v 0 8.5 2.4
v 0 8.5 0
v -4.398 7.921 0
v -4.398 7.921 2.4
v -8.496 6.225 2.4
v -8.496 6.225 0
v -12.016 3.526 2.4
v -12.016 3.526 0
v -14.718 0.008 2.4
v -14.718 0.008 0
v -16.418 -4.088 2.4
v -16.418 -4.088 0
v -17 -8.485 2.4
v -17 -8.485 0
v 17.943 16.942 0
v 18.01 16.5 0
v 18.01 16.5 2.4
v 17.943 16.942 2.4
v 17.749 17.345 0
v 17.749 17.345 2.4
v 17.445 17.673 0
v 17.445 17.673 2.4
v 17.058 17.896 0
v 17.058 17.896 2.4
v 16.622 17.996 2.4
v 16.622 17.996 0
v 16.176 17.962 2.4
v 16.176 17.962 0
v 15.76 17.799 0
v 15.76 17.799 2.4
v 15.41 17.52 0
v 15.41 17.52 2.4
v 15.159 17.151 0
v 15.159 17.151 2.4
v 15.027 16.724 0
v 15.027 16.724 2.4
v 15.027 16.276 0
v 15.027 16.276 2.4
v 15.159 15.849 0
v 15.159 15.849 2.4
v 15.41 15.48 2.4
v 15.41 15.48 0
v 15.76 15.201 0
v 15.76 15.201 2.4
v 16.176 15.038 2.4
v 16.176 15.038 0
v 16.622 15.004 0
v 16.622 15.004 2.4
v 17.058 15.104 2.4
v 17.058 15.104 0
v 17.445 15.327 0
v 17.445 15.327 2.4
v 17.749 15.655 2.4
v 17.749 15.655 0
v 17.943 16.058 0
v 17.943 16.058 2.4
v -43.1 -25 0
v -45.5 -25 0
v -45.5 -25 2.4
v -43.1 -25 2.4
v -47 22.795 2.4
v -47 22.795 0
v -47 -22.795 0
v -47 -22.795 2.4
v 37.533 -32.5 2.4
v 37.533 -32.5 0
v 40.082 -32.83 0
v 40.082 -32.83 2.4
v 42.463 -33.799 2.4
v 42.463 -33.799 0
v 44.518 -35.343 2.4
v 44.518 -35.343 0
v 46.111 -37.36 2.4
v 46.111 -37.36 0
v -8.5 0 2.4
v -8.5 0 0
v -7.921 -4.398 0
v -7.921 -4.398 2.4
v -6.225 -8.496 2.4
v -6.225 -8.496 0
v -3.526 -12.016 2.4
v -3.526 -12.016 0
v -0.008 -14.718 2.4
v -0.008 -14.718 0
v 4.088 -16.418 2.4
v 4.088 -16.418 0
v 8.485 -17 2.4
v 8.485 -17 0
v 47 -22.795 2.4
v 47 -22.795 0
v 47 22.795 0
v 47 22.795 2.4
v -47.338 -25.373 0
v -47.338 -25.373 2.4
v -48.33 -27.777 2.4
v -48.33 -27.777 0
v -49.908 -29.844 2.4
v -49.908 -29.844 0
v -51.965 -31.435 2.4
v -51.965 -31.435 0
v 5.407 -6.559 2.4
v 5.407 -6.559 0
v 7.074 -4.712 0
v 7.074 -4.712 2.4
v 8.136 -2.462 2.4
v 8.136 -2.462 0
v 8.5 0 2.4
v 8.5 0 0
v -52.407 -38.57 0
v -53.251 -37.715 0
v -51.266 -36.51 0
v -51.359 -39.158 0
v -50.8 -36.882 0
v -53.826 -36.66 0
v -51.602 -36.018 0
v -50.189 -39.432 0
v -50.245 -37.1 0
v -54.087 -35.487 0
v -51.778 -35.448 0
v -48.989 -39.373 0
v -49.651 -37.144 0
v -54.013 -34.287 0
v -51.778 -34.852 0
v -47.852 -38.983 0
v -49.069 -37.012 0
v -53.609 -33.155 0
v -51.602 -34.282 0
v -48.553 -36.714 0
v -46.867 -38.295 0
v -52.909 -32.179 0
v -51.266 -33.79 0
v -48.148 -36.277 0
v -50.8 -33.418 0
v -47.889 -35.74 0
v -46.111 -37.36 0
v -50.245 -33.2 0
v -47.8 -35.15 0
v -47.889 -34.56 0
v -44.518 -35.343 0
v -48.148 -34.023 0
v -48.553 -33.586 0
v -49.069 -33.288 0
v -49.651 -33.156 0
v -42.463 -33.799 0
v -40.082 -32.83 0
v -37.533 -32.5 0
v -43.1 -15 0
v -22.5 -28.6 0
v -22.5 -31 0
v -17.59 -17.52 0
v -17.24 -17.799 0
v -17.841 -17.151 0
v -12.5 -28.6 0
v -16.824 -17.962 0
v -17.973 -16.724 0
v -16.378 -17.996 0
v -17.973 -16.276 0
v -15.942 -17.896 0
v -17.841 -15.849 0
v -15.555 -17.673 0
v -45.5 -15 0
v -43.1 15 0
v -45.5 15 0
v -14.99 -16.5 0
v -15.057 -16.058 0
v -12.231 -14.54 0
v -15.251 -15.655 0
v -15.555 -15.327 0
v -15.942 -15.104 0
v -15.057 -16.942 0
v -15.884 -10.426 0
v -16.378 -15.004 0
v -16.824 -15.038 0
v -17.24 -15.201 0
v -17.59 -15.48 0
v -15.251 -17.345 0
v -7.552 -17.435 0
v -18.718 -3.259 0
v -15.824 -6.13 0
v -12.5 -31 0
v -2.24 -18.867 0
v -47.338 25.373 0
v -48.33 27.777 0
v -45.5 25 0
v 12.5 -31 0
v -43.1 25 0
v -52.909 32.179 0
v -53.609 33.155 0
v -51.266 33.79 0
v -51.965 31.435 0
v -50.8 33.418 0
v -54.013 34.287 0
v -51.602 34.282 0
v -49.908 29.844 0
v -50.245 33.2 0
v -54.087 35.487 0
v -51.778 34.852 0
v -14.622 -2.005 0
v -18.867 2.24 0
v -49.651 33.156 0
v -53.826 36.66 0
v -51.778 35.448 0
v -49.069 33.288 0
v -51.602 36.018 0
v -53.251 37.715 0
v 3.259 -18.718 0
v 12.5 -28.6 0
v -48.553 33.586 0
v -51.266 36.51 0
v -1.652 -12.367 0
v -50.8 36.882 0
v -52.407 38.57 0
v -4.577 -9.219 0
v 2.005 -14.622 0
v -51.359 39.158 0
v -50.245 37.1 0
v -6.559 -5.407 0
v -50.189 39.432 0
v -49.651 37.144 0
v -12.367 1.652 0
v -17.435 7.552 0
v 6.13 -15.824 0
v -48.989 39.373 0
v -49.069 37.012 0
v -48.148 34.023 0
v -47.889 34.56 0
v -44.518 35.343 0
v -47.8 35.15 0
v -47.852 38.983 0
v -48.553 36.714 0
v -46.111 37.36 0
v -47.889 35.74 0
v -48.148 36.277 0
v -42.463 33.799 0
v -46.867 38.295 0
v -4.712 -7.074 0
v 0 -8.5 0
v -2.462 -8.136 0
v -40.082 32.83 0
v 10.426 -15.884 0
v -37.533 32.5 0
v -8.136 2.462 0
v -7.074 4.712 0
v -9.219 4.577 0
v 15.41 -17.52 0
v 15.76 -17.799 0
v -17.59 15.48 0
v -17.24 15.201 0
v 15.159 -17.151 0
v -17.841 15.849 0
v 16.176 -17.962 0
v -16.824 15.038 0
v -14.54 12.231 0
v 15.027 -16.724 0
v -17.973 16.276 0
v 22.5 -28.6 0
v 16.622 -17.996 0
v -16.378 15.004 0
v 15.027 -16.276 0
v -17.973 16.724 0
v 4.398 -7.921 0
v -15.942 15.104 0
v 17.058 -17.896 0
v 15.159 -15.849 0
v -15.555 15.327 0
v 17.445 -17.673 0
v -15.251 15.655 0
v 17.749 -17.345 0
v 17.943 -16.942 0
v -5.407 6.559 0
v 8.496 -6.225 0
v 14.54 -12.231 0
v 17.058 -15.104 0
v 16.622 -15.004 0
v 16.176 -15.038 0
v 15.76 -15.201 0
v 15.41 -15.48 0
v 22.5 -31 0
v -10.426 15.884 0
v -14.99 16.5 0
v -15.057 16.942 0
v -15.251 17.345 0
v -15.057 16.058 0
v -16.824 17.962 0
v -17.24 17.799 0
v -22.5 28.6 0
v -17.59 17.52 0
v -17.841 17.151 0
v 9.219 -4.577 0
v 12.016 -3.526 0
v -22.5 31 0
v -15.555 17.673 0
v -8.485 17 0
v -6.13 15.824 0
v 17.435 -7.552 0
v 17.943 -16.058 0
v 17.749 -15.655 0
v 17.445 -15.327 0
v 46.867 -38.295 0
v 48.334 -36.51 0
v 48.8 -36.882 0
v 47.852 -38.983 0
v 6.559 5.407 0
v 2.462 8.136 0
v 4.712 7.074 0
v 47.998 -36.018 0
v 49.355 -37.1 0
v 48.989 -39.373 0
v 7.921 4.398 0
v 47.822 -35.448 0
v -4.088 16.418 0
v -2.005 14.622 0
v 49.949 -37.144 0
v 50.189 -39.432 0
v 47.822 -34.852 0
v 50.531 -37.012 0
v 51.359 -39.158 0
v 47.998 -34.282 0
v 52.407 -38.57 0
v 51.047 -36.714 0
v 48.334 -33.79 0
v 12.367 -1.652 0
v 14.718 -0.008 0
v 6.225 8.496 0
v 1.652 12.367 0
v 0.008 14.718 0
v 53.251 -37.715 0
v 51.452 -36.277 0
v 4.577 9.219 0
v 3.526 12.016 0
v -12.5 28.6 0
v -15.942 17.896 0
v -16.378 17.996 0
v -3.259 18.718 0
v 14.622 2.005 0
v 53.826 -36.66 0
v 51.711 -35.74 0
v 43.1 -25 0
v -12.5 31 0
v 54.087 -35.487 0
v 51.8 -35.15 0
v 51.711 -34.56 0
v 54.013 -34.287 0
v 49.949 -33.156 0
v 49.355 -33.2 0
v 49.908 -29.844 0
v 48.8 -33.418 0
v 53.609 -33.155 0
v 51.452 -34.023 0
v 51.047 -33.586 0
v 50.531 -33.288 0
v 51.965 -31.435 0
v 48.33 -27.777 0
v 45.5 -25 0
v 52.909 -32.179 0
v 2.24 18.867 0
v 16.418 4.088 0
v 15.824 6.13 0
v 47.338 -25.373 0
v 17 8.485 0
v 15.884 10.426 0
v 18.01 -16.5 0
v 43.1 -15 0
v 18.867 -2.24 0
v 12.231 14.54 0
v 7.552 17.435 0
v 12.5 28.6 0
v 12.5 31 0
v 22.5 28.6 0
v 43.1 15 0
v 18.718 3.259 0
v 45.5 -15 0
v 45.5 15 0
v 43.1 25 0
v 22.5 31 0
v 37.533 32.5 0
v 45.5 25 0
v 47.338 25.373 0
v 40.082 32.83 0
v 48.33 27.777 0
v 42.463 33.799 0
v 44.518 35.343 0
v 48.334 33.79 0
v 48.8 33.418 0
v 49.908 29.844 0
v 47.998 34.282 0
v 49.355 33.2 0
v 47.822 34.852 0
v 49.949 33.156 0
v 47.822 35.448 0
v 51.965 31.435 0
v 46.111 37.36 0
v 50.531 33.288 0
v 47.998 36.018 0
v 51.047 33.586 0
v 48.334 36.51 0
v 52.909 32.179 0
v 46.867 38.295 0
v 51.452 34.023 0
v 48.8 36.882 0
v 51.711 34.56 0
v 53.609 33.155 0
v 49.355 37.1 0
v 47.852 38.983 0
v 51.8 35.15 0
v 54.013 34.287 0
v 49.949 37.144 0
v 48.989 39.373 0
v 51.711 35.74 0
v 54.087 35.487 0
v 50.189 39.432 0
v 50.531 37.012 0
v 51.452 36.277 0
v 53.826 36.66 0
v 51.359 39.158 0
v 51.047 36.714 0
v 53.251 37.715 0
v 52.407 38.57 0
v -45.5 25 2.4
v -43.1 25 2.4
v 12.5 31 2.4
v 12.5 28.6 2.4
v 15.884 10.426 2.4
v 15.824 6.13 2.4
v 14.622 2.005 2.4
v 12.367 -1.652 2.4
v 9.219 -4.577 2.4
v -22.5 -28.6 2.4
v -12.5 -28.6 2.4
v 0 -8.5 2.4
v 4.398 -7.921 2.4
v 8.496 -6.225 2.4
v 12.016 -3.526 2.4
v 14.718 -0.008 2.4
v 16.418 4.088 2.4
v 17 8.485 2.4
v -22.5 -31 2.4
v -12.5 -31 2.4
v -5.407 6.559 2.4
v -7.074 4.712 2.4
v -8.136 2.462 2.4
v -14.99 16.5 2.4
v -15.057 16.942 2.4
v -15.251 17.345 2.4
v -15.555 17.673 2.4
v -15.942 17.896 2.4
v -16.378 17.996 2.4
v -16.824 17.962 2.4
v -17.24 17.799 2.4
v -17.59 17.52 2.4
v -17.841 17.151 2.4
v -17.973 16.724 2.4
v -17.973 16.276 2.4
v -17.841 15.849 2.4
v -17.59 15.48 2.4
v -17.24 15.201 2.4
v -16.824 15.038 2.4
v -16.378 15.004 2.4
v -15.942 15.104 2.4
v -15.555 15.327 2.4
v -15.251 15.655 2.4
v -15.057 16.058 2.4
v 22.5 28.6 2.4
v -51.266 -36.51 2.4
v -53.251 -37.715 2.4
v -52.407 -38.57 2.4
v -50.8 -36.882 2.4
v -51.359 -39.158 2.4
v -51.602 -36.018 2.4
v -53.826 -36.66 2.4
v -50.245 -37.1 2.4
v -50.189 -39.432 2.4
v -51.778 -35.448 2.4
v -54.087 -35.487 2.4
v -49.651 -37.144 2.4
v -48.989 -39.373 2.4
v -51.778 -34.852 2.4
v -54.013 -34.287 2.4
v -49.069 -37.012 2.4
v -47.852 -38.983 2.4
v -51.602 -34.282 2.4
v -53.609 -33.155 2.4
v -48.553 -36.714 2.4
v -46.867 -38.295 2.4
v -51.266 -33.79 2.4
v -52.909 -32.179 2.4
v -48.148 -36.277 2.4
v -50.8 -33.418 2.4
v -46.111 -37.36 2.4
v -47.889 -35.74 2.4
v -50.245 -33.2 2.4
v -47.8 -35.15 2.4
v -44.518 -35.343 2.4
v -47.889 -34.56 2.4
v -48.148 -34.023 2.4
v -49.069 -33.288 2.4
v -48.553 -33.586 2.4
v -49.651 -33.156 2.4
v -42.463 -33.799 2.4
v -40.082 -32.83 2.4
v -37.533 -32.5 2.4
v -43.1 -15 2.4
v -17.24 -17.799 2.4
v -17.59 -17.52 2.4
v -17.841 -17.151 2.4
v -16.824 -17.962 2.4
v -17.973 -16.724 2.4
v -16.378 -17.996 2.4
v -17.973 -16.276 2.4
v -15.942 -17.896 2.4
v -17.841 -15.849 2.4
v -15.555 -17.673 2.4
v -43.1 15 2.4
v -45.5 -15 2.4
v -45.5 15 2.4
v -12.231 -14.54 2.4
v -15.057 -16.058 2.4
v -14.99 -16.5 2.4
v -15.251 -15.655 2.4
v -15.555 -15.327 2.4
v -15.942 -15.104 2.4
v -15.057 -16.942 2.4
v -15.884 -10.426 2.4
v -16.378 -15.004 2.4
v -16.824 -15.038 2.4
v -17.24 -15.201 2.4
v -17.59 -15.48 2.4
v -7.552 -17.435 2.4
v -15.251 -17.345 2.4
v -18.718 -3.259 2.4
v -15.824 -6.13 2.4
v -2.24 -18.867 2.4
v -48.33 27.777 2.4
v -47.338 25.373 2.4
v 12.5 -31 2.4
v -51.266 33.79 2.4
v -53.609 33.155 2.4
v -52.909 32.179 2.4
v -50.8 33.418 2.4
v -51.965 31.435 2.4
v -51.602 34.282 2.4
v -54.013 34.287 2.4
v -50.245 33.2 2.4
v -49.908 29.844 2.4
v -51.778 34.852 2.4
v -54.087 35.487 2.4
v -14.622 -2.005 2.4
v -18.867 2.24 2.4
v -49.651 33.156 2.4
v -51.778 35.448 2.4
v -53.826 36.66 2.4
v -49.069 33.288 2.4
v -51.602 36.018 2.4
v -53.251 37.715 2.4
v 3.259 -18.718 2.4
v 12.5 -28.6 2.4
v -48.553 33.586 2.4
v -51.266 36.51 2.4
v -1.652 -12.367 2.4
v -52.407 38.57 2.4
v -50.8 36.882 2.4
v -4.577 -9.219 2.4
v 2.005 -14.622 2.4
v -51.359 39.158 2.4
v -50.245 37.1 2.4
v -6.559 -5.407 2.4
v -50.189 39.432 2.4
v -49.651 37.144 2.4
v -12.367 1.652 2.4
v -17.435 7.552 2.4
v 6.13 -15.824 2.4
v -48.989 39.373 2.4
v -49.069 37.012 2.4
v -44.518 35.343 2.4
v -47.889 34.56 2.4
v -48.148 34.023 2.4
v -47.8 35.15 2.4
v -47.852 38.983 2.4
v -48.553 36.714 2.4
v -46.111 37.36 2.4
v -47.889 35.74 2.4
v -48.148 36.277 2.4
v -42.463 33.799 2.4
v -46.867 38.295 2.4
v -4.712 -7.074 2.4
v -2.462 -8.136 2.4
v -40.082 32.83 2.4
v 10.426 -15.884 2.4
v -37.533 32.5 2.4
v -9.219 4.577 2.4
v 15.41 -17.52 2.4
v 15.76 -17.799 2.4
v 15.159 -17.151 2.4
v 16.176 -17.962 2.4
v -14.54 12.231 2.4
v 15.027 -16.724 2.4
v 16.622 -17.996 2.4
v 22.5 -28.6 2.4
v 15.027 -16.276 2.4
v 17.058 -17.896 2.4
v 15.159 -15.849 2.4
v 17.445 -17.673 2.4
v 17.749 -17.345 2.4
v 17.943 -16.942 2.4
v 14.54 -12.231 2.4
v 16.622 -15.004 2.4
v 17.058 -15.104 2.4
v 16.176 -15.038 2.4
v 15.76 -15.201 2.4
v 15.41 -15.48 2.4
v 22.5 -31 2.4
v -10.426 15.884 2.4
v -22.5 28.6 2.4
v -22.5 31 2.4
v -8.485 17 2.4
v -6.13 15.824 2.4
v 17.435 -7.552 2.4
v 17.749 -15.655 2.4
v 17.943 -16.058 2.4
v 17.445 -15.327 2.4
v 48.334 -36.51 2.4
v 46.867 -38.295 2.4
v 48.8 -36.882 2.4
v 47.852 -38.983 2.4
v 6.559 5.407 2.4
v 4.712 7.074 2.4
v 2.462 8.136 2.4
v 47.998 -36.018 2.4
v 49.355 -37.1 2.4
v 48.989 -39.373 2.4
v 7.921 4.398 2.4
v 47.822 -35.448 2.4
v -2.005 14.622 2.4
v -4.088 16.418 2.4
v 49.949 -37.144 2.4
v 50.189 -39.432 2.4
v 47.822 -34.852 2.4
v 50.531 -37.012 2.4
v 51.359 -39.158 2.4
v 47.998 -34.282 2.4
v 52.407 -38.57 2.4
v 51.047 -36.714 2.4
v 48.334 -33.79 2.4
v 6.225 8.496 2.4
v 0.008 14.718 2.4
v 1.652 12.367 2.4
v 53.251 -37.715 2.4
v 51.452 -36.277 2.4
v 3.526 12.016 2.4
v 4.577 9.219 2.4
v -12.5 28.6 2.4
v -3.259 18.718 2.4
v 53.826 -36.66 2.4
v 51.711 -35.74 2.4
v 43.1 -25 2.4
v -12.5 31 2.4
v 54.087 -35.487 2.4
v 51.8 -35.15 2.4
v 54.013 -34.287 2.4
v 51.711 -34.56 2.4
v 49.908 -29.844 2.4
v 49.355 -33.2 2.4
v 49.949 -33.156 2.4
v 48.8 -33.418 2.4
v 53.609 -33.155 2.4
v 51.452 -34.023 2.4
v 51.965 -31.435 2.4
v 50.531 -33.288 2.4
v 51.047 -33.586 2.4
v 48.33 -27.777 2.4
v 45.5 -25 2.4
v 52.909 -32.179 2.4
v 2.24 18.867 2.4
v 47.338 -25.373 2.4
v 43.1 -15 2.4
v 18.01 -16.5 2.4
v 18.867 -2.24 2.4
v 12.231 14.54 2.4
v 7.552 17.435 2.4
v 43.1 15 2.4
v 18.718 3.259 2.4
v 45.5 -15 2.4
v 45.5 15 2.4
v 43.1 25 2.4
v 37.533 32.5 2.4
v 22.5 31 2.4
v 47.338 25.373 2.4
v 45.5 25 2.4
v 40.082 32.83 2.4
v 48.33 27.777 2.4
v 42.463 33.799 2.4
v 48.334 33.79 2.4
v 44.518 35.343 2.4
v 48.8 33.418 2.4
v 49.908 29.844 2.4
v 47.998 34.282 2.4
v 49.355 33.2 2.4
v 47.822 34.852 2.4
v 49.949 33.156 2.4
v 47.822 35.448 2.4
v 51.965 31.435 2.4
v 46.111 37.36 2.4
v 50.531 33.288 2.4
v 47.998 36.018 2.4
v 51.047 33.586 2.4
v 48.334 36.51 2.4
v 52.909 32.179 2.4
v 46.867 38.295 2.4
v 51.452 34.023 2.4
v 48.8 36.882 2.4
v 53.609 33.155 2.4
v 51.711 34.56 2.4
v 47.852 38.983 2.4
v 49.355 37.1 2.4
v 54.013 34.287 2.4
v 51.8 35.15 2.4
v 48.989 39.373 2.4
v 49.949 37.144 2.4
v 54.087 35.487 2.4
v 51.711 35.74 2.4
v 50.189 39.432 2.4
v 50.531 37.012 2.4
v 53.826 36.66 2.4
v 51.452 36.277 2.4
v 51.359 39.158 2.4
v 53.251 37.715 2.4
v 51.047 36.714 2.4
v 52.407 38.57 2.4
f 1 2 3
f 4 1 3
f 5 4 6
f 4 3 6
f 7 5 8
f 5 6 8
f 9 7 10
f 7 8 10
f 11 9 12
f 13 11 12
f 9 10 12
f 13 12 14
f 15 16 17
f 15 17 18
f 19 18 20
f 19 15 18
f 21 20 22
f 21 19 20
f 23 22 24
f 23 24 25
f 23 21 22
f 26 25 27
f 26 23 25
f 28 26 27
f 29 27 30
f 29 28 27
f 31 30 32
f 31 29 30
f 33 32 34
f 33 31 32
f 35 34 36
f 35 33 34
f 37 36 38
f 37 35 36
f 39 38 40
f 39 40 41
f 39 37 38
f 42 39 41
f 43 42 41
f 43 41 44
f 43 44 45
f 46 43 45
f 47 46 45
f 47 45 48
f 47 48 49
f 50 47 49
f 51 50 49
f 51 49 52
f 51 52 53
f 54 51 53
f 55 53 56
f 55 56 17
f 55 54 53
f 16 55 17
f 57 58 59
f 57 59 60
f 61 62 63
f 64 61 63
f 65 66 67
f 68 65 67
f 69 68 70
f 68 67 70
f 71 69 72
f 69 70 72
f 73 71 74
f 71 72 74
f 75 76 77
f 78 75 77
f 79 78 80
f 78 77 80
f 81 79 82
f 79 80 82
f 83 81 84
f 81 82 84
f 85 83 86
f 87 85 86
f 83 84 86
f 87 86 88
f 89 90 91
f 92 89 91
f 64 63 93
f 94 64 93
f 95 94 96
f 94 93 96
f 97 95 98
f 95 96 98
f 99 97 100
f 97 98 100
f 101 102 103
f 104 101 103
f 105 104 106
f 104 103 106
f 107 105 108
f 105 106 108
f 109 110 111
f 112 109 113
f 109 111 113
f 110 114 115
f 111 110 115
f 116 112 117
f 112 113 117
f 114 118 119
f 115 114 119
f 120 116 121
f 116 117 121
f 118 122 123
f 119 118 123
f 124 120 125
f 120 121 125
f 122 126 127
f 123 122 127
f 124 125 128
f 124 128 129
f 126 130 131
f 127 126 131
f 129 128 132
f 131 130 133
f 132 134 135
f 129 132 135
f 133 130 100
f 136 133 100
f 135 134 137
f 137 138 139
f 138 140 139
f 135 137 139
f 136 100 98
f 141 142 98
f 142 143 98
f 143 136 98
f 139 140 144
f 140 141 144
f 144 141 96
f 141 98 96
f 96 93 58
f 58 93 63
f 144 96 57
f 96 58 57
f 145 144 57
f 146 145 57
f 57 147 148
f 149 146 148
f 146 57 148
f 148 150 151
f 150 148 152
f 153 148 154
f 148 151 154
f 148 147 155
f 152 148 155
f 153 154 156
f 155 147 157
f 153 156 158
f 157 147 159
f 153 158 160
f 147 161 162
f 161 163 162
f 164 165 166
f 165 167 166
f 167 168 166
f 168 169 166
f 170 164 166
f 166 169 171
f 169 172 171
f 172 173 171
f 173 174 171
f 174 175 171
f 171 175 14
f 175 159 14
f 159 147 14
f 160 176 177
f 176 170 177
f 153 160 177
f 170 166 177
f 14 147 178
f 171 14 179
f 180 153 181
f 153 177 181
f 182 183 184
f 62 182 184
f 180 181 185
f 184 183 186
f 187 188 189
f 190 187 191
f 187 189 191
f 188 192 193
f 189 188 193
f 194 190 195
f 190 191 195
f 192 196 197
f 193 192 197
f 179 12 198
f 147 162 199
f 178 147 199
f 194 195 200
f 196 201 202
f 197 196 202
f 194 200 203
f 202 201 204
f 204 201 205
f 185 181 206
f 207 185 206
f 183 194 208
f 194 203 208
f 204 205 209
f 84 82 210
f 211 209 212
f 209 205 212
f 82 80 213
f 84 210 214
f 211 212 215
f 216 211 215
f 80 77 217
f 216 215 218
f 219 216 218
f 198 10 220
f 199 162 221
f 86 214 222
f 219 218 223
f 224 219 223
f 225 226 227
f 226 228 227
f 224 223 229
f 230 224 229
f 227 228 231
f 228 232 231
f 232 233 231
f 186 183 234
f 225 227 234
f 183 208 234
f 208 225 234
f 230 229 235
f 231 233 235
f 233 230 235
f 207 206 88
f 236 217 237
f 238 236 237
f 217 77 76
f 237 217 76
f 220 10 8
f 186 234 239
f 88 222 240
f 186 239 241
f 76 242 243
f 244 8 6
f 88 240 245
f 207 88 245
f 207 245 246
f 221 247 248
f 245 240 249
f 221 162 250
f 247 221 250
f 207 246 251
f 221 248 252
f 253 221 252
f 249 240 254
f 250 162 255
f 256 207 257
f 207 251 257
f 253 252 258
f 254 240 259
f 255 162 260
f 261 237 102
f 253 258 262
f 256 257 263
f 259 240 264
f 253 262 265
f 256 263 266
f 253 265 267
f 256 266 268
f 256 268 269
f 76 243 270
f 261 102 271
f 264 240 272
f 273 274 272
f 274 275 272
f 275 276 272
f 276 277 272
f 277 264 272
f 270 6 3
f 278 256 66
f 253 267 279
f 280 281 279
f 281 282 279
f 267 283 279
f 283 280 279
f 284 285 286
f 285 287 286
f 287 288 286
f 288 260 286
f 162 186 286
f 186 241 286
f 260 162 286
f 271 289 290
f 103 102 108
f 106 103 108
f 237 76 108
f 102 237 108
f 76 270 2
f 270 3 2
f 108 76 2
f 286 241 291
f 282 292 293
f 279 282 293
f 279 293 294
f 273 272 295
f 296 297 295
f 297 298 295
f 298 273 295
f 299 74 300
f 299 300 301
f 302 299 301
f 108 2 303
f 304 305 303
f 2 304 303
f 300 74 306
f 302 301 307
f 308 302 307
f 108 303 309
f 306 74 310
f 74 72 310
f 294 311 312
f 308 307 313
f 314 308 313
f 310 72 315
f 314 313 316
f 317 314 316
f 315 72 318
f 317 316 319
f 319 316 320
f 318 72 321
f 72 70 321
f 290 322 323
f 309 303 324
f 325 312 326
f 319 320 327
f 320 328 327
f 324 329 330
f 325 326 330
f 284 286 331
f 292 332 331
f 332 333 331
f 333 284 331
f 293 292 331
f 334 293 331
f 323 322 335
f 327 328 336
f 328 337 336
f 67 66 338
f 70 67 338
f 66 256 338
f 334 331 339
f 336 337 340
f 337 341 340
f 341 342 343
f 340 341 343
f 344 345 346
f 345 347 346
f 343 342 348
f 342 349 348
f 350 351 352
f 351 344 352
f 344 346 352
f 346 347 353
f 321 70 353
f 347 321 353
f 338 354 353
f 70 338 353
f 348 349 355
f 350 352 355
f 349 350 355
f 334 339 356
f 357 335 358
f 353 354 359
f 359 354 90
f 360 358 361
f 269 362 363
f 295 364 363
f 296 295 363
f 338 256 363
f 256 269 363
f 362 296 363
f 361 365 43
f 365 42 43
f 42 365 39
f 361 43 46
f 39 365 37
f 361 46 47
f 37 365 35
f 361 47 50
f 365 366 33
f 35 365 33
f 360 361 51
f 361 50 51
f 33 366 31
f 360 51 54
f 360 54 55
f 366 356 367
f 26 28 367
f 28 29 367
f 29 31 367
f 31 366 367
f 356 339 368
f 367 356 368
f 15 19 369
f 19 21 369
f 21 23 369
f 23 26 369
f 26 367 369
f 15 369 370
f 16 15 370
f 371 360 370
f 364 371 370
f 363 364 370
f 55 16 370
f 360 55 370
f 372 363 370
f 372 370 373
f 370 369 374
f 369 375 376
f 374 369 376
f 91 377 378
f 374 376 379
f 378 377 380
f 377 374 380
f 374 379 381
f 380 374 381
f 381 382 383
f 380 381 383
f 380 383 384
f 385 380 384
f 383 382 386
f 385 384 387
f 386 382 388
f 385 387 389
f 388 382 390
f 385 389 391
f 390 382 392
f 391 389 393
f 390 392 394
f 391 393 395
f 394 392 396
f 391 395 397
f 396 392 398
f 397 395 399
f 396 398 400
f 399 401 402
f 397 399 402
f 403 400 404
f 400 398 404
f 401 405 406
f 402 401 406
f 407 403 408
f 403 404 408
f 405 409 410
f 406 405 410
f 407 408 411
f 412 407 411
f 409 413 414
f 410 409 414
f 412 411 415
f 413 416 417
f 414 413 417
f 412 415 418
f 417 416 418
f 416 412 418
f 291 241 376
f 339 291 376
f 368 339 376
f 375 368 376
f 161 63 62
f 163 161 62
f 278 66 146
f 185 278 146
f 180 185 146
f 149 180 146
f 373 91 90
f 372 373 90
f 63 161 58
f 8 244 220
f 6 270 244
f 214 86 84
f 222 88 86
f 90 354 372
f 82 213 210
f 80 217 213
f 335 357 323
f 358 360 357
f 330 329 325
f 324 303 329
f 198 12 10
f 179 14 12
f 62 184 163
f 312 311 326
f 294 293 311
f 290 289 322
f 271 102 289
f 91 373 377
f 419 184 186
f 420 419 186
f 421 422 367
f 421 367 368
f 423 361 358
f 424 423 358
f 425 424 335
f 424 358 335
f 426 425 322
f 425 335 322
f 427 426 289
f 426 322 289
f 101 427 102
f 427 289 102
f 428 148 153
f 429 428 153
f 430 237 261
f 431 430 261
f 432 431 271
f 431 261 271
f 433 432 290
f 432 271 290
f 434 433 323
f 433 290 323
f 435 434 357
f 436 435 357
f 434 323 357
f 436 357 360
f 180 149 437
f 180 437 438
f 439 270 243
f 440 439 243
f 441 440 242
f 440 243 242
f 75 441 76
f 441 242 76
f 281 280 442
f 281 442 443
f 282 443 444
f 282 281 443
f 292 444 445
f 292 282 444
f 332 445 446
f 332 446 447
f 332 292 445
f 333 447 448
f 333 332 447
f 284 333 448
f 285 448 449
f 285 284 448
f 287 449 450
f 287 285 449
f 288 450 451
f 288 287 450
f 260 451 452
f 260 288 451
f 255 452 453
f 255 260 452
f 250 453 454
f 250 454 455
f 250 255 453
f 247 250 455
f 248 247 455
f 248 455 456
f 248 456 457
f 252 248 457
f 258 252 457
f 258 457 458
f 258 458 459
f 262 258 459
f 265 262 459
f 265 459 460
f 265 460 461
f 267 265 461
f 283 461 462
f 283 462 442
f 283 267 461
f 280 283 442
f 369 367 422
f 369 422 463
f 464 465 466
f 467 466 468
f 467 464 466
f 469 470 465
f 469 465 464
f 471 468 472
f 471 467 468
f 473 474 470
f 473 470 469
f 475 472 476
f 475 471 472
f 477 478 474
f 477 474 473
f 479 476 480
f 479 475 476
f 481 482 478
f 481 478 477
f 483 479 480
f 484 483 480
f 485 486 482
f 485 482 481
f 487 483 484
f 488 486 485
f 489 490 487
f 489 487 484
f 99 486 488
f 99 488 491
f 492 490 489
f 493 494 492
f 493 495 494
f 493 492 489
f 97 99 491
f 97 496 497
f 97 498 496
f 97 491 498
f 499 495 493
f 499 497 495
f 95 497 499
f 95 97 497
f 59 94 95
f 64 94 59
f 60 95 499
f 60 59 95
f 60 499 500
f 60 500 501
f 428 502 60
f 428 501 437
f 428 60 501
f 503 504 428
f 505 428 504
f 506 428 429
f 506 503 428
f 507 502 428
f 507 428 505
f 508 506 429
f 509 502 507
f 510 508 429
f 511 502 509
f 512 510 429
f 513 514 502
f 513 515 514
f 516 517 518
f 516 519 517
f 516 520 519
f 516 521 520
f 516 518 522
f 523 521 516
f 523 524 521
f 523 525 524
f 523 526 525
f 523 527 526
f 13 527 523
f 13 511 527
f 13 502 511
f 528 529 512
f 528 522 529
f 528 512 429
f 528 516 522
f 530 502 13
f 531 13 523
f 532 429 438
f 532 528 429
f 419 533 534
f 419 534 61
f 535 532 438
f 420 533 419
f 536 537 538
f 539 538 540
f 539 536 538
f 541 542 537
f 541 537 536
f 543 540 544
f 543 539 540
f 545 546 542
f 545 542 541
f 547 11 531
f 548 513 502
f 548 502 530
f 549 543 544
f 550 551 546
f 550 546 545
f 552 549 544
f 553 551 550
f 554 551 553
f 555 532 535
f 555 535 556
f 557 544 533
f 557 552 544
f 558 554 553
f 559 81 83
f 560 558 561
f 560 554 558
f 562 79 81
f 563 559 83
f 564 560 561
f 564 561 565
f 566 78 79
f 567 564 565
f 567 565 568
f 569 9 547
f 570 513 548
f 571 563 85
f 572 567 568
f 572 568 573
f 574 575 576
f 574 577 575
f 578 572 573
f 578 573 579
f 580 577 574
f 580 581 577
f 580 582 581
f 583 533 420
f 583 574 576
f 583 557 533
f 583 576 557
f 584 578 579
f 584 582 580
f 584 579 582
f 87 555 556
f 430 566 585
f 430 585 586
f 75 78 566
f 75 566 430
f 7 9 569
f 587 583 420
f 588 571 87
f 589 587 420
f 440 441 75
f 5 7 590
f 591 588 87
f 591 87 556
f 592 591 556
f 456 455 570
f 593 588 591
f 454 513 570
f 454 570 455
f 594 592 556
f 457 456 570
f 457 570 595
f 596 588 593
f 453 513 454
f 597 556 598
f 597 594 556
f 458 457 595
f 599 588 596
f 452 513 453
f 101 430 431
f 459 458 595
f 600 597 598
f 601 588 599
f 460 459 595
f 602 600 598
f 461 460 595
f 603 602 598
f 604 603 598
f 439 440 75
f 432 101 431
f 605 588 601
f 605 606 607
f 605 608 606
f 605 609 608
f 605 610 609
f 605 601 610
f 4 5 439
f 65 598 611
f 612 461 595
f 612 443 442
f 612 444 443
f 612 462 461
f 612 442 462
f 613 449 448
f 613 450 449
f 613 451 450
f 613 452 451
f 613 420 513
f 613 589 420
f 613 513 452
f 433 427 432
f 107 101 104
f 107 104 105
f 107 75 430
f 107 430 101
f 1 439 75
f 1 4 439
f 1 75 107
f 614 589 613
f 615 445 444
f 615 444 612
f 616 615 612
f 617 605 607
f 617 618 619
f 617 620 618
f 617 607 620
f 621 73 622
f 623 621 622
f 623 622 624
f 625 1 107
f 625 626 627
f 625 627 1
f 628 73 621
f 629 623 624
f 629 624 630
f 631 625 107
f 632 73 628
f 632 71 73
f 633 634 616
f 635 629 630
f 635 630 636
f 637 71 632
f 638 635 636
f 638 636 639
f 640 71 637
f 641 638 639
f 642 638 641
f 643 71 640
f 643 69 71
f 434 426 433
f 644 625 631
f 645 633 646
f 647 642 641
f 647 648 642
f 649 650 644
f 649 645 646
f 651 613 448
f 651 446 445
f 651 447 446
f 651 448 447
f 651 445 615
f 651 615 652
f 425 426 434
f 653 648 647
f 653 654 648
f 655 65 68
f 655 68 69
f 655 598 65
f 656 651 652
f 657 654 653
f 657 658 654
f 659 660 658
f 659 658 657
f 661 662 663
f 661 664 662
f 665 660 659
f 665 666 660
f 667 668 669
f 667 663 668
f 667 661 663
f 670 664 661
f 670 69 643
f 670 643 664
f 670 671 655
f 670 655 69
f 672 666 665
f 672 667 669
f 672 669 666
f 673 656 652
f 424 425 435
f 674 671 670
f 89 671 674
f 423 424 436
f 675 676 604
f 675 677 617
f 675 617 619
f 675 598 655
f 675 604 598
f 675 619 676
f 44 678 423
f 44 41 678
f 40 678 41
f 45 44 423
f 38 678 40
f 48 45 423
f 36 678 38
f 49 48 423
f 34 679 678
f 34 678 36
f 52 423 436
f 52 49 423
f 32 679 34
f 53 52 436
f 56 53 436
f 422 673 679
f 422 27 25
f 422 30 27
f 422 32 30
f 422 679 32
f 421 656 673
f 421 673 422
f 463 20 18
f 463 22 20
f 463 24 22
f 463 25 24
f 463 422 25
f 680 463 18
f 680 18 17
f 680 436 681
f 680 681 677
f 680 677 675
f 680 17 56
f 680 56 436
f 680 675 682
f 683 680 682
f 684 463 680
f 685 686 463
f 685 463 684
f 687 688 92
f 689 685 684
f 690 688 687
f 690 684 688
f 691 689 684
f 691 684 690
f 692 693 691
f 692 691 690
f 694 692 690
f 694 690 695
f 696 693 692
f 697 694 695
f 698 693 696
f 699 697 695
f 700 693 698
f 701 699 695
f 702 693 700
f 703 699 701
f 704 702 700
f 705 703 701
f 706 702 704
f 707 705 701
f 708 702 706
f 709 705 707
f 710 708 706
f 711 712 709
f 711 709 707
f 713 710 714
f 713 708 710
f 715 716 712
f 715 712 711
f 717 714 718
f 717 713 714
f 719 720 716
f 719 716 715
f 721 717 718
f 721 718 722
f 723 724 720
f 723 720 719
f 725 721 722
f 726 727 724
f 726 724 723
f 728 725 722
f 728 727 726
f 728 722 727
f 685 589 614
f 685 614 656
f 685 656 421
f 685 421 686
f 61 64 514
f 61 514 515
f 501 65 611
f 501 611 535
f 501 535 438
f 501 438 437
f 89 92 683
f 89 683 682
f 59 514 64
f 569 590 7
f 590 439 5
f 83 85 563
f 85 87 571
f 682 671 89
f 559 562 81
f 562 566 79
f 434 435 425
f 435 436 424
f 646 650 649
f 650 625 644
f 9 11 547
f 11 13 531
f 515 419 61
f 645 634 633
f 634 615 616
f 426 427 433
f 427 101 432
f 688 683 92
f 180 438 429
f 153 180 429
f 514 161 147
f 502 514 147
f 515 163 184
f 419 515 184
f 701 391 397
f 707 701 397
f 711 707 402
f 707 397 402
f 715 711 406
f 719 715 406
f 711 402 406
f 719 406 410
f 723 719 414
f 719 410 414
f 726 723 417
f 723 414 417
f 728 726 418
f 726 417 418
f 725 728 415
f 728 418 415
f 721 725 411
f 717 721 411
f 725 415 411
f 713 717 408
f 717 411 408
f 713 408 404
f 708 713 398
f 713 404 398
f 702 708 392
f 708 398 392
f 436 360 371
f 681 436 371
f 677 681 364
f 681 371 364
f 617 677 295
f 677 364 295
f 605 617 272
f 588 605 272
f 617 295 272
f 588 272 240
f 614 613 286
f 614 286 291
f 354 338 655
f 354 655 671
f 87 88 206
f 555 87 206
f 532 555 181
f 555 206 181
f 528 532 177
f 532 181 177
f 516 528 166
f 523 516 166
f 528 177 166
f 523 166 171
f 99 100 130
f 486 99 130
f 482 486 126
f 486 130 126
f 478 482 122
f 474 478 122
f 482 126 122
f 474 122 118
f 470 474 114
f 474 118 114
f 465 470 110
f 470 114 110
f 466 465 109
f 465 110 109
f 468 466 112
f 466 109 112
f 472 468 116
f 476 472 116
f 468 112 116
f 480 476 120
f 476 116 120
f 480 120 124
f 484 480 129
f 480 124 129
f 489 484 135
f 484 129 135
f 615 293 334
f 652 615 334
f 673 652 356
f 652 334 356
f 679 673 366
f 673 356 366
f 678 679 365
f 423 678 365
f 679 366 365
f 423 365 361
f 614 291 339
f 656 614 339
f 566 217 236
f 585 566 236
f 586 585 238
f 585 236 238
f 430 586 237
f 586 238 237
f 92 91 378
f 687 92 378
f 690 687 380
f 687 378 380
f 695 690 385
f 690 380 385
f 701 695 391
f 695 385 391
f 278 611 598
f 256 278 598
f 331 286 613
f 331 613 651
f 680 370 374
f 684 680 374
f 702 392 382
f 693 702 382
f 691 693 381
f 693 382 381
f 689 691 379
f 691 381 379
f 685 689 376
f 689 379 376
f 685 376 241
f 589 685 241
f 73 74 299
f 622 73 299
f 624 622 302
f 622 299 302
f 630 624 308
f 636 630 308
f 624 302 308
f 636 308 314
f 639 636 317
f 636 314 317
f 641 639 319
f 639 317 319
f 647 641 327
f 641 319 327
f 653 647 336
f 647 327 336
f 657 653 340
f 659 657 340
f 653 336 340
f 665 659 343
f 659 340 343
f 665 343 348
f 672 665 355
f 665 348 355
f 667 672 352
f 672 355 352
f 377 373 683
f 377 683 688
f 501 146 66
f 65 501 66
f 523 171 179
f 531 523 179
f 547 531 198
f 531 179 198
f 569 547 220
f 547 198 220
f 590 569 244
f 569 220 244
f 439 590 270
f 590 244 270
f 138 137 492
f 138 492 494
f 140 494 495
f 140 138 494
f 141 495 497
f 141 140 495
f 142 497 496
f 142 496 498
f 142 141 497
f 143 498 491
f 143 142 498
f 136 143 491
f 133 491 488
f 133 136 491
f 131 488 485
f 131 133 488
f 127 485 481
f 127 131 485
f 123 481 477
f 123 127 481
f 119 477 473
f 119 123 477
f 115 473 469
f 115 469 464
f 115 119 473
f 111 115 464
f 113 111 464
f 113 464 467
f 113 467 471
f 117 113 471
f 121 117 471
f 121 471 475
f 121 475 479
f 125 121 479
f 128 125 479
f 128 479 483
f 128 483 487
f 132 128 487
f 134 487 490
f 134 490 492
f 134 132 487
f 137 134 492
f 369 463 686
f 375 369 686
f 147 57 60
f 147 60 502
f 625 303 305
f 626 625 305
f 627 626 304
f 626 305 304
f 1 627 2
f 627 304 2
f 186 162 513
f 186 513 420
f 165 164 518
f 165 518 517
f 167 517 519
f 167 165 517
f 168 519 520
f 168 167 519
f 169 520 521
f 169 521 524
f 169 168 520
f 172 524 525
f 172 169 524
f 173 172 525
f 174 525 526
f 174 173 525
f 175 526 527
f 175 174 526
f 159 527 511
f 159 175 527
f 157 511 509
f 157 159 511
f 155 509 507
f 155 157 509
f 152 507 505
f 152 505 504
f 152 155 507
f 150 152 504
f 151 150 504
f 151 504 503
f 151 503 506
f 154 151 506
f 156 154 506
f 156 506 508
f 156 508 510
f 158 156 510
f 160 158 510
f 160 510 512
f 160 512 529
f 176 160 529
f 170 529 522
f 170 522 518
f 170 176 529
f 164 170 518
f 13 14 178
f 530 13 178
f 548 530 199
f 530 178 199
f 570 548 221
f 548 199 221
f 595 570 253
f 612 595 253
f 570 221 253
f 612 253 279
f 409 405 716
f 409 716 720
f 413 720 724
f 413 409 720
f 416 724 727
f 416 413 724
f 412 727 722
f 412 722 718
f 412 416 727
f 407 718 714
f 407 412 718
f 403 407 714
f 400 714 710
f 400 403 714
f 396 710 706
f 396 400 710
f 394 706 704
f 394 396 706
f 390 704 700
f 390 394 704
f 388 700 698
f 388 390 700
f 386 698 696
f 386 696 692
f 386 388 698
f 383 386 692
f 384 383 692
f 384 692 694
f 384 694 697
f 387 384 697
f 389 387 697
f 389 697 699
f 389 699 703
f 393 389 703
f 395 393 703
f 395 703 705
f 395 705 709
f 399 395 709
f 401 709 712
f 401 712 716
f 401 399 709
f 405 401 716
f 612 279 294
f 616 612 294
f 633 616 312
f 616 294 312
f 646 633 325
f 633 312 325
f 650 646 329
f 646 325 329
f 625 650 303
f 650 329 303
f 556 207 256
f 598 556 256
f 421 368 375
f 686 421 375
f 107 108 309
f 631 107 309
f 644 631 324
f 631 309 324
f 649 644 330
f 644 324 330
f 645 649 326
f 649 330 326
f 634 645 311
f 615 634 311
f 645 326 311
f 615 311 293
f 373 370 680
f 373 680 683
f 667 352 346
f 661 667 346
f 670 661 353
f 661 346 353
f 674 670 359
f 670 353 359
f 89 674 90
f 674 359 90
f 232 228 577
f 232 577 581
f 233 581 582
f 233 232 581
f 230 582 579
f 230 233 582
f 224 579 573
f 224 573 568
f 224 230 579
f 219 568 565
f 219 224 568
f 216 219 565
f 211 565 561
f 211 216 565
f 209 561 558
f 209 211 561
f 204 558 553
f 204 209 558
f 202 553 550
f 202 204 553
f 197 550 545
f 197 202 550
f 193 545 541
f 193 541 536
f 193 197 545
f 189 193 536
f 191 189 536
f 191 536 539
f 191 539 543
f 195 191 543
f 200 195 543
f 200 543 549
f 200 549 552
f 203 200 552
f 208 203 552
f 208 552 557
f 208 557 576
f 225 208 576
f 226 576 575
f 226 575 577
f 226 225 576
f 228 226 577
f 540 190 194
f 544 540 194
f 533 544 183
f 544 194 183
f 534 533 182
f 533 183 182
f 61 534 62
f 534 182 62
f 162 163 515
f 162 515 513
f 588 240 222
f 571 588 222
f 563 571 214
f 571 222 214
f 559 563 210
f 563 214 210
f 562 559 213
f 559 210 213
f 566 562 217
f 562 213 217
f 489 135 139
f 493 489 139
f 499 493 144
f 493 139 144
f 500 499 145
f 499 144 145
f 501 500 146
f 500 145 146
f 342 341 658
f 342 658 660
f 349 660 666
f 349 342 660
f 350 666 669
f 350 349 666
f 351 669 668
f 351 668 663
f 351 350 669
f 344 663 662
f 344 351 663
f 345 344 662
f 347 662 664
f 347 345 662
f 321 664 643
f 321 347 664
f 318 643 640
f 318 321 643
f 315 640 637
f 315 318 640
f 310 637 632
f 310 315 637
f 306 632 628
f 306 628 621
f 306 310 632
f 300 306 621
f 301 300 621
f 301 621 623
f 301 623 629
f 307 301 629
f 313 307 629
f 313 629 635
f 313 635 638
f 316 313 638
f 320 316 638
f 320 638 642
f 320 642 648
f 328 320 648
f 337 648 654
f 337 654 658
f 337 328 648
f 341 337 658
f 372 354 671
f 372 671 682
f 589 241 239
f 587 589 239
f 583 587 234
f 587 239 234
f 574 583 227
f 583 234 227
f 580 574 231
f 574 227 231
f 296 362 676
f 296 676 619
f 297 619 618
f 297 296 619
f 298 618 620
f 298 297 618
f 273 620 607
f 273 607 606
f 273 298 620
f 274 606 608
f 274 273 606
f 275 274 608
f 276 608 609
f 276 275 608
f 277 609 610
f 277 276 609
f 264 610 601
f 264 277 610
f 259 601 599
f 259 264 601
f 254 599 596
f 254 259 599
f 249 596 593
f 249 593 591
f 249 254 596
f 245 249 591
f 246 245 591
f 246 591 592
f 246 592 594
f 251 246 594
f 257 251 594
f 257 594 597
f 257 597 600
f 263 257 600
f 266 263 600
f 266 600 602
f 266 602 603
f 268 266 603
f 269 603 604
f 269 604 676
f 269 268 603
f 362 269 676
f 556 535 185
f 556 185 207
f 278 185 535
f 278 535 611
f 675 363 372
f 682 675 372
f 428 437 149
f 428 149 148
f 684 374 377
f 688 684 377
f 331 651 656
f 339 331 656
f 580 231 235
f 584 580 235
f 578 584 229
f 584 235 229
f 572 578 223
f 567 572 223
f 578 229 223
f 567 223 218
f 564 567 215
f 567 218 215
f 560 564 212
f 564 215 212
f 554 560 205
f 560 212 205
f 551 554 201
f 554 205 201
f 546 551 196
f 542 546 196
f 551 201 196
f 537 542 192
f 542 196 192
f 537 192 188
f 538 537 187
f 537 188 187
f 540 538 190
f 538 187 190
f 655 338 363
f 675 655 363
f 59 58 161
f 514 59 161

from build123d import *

# Parameters (mm, degrees)
F0_R     = 2
F0_W     = 2.4
F0_H     = 10
F0_W_2   = 10
F0_H_2   = 2.4
F0_R_2   = 1.5
F1_DEPTH = 2.4


with BuildPart() as f1:
    # F0 (on Top) → F1 (new body)
    with BuildSketch(Plane.XY):
        with BuildLine():
            ThreePointArc((46.111466, 37.36014), (42.463054, 33.799465), (37.533481, 32.5))
            Line((37.533481, 32.5), (-37.533481, 32.5))
            ThreePointArc((-37.533481, 32.5), (-42.463054, 33.799465), (-46.111466, 37.36014))
            ThreePointArc((-46.111466, 37.36014), (-52.859026, 38.171979), (-51.965035, 31.434812))
            ThreePointArc((-51.965035, 31.434812), (-48.329658, 27.777326), (-47, 22.794839))
            Line((-47, 22.794839), (-47, 0))
            Line((-47, 0), (-47, -22.794839))
            ThreePointArc((-47, -22.794839), (-48.329658, -27.777326), (-51.965035, -31.434812))
            ThreePointArc((-51.965035, -31.434812), (-52.859026, -38.171979), (-46.111466, -37.36014))
            ThreePointArc((-46.111466, -37.36014), (-42.463054, -33.799465), (-37.533481, -32.5))
            Line((-37.533481, -32.5), (37.533481, -32.5))
            ThreePointArc((37.533481, -32.5), (42.463054, -33.799465), (46.111466, -37.36014))
            ThreePointArc((46.111466, -37.36014), (52.859026, -38.171979), (51.965035, -31.434812))
            ThreePointArc((51.965035, -31.434812), (48.329658, -27.777326), (47, -22.794839))
            Line((47, -22.794839), (47, 22.794839))
            ThreePointArc((47, 22.794839), (48.329658, 27.777326), (51.965035, 31.434812))
            ThreePointArc((51.965035, 31.434812), (52.859026, 38.171979), (46.111466, 37.36014))
        make_face()
        with Locations((-49.8, -35.15)):
            Circle(F0_R, mode=Mode.SUBTRACT)
        with Locations((-44.3, -20)):
            Rectangle(F0_W, F0_H, mode=Mode.SUBTRACT)
        with Locations((-17.5, -29.8)):
            Rectangle(F0_W_2, F0_H_2, mode=Mode.SUBTRACT)
        with Locations((-16.49, -16.5)):
            Circle(F0_R_2, mode=Mode.SUBTRACT)
        with BuildLine():
            ThreePointArc((-15.883599, -10.426471), (-13.617771, -0.10022), (-5.406647, 6.558824))
            ThreePointArc((-5.406647, 6.558824), (-7.687864, 3.625845), (-8.5, 0))
            ThreePointArc((-8.5, 0), (-3.526013, -12.015615), (8.485294, -16.999994))
            ThreePointArc((8.485294, -16.999994), (-4.948387, -18.344303), (-15.883599, -10.426471))
        make_face(mode=Mode.SUBTRACT)
        with Locations((17.5, -29.8)):
            Rectangle(F0_W_2, F0_H_2, mode=Mode.SUBTRACT)
        with Locations((49.8, -35.15)):
            Circle(F0_R, mode=Mode.SUBTRACT)
        with Locations((44.3, -20)):
            Rectangle(F0_W, F0_H, mode=Mode.SUBTRACT)
        with Locations((16.51, -16.5)):
            Circle(F0_R_2, mode=Mode.SUBTRACT)
        with BuildLine():
            ThreePointArc((-6.558824, -5.406647), (-3.625845, -7.687864), (0, -8.5))
            ThreePointArc((0, -8.5), (12.015615, -3.526013), (16.999994, 8.485294))
            ThreePointArc((16.999994, 8.485294), (18.344303, -4.948387), (10.426471, -15.883599))
            ThreePointArc((10.426471, -15.883599), (0.10022, -13.617771), (-6.558824, -5.406647))
        make_face(mode=Mode.SUBTRACT)
        with BuildLine():
            ThreePointArc((-10.426471, 15.883599), (-0.10022, 13.617771), (6.558824, 5.406647))
            ThreePointArc((6.558824, 5.406647), (3.625845, 7.687864), (0, 8.5))
            ThreePointArc((0, 8.5), (-12.015615, 3.526013), (-16.999994, -8.485294))
            ThreePointArc((-16.999994, -8.485294), (-18.344303, 4.948387), (-10.426471, 15.883599))
        make_face(mode=Mode.SUBTRACT)
        with Locations((-16.49, 16.5)):
            Circle(F0_R_2, mode=Mode.SUBTRACT)
        with Locations((-44.3, 20)):
            Rectangle(F0_W, F0_H, mode=Mode.SUBTRACT)
        with Locations((-49.8, 35.15)):
            Circle(F0_R, mode=Mode.SUBTRACT)
        with Locations((-17.5, 29.8)):
            Rectangle(F0_W_2, F0_H_2, mode=Mode.SUBTRACT)
        with BuildLine():
            ThreePointArc((-8.485294, 16.999994), (4.948387, 18.344303), (15.883599, 10.426471))
            ThreePointArc((15.883599, 10.426471), (13.617771, 0.10022), (5.406647, -6.558824))
            ThreePointArc((5.406647, -6.558824), (7.687864, -3.625845), (8.5, 0))
            ThreePointArc((8.5, 0), (3.526013, 12.015615), (-8.485294, 16.999994))
        make_face(mode=Mode.SUBTRACT)
        with Locations((16.51, 16.5)):
            Circle(F0_R_2, mode=Mode.SUBTRACT)
        with Locations((17.5, 29.8)):
            Rectangle(F0_W_2, F0_H_2, mode=Mode.SUBTRACT)
        with Locations((44.3, 20)):
            Rectangle(F0_W, F0_H, mode=Mode.SUBTRACT)
        with Locations((49.8, 35.15)):
            Circle(F0_R, mode=Mode.SUBTRACT)
    extrude(amount=F1_DEPTH)


solid = f1.part
